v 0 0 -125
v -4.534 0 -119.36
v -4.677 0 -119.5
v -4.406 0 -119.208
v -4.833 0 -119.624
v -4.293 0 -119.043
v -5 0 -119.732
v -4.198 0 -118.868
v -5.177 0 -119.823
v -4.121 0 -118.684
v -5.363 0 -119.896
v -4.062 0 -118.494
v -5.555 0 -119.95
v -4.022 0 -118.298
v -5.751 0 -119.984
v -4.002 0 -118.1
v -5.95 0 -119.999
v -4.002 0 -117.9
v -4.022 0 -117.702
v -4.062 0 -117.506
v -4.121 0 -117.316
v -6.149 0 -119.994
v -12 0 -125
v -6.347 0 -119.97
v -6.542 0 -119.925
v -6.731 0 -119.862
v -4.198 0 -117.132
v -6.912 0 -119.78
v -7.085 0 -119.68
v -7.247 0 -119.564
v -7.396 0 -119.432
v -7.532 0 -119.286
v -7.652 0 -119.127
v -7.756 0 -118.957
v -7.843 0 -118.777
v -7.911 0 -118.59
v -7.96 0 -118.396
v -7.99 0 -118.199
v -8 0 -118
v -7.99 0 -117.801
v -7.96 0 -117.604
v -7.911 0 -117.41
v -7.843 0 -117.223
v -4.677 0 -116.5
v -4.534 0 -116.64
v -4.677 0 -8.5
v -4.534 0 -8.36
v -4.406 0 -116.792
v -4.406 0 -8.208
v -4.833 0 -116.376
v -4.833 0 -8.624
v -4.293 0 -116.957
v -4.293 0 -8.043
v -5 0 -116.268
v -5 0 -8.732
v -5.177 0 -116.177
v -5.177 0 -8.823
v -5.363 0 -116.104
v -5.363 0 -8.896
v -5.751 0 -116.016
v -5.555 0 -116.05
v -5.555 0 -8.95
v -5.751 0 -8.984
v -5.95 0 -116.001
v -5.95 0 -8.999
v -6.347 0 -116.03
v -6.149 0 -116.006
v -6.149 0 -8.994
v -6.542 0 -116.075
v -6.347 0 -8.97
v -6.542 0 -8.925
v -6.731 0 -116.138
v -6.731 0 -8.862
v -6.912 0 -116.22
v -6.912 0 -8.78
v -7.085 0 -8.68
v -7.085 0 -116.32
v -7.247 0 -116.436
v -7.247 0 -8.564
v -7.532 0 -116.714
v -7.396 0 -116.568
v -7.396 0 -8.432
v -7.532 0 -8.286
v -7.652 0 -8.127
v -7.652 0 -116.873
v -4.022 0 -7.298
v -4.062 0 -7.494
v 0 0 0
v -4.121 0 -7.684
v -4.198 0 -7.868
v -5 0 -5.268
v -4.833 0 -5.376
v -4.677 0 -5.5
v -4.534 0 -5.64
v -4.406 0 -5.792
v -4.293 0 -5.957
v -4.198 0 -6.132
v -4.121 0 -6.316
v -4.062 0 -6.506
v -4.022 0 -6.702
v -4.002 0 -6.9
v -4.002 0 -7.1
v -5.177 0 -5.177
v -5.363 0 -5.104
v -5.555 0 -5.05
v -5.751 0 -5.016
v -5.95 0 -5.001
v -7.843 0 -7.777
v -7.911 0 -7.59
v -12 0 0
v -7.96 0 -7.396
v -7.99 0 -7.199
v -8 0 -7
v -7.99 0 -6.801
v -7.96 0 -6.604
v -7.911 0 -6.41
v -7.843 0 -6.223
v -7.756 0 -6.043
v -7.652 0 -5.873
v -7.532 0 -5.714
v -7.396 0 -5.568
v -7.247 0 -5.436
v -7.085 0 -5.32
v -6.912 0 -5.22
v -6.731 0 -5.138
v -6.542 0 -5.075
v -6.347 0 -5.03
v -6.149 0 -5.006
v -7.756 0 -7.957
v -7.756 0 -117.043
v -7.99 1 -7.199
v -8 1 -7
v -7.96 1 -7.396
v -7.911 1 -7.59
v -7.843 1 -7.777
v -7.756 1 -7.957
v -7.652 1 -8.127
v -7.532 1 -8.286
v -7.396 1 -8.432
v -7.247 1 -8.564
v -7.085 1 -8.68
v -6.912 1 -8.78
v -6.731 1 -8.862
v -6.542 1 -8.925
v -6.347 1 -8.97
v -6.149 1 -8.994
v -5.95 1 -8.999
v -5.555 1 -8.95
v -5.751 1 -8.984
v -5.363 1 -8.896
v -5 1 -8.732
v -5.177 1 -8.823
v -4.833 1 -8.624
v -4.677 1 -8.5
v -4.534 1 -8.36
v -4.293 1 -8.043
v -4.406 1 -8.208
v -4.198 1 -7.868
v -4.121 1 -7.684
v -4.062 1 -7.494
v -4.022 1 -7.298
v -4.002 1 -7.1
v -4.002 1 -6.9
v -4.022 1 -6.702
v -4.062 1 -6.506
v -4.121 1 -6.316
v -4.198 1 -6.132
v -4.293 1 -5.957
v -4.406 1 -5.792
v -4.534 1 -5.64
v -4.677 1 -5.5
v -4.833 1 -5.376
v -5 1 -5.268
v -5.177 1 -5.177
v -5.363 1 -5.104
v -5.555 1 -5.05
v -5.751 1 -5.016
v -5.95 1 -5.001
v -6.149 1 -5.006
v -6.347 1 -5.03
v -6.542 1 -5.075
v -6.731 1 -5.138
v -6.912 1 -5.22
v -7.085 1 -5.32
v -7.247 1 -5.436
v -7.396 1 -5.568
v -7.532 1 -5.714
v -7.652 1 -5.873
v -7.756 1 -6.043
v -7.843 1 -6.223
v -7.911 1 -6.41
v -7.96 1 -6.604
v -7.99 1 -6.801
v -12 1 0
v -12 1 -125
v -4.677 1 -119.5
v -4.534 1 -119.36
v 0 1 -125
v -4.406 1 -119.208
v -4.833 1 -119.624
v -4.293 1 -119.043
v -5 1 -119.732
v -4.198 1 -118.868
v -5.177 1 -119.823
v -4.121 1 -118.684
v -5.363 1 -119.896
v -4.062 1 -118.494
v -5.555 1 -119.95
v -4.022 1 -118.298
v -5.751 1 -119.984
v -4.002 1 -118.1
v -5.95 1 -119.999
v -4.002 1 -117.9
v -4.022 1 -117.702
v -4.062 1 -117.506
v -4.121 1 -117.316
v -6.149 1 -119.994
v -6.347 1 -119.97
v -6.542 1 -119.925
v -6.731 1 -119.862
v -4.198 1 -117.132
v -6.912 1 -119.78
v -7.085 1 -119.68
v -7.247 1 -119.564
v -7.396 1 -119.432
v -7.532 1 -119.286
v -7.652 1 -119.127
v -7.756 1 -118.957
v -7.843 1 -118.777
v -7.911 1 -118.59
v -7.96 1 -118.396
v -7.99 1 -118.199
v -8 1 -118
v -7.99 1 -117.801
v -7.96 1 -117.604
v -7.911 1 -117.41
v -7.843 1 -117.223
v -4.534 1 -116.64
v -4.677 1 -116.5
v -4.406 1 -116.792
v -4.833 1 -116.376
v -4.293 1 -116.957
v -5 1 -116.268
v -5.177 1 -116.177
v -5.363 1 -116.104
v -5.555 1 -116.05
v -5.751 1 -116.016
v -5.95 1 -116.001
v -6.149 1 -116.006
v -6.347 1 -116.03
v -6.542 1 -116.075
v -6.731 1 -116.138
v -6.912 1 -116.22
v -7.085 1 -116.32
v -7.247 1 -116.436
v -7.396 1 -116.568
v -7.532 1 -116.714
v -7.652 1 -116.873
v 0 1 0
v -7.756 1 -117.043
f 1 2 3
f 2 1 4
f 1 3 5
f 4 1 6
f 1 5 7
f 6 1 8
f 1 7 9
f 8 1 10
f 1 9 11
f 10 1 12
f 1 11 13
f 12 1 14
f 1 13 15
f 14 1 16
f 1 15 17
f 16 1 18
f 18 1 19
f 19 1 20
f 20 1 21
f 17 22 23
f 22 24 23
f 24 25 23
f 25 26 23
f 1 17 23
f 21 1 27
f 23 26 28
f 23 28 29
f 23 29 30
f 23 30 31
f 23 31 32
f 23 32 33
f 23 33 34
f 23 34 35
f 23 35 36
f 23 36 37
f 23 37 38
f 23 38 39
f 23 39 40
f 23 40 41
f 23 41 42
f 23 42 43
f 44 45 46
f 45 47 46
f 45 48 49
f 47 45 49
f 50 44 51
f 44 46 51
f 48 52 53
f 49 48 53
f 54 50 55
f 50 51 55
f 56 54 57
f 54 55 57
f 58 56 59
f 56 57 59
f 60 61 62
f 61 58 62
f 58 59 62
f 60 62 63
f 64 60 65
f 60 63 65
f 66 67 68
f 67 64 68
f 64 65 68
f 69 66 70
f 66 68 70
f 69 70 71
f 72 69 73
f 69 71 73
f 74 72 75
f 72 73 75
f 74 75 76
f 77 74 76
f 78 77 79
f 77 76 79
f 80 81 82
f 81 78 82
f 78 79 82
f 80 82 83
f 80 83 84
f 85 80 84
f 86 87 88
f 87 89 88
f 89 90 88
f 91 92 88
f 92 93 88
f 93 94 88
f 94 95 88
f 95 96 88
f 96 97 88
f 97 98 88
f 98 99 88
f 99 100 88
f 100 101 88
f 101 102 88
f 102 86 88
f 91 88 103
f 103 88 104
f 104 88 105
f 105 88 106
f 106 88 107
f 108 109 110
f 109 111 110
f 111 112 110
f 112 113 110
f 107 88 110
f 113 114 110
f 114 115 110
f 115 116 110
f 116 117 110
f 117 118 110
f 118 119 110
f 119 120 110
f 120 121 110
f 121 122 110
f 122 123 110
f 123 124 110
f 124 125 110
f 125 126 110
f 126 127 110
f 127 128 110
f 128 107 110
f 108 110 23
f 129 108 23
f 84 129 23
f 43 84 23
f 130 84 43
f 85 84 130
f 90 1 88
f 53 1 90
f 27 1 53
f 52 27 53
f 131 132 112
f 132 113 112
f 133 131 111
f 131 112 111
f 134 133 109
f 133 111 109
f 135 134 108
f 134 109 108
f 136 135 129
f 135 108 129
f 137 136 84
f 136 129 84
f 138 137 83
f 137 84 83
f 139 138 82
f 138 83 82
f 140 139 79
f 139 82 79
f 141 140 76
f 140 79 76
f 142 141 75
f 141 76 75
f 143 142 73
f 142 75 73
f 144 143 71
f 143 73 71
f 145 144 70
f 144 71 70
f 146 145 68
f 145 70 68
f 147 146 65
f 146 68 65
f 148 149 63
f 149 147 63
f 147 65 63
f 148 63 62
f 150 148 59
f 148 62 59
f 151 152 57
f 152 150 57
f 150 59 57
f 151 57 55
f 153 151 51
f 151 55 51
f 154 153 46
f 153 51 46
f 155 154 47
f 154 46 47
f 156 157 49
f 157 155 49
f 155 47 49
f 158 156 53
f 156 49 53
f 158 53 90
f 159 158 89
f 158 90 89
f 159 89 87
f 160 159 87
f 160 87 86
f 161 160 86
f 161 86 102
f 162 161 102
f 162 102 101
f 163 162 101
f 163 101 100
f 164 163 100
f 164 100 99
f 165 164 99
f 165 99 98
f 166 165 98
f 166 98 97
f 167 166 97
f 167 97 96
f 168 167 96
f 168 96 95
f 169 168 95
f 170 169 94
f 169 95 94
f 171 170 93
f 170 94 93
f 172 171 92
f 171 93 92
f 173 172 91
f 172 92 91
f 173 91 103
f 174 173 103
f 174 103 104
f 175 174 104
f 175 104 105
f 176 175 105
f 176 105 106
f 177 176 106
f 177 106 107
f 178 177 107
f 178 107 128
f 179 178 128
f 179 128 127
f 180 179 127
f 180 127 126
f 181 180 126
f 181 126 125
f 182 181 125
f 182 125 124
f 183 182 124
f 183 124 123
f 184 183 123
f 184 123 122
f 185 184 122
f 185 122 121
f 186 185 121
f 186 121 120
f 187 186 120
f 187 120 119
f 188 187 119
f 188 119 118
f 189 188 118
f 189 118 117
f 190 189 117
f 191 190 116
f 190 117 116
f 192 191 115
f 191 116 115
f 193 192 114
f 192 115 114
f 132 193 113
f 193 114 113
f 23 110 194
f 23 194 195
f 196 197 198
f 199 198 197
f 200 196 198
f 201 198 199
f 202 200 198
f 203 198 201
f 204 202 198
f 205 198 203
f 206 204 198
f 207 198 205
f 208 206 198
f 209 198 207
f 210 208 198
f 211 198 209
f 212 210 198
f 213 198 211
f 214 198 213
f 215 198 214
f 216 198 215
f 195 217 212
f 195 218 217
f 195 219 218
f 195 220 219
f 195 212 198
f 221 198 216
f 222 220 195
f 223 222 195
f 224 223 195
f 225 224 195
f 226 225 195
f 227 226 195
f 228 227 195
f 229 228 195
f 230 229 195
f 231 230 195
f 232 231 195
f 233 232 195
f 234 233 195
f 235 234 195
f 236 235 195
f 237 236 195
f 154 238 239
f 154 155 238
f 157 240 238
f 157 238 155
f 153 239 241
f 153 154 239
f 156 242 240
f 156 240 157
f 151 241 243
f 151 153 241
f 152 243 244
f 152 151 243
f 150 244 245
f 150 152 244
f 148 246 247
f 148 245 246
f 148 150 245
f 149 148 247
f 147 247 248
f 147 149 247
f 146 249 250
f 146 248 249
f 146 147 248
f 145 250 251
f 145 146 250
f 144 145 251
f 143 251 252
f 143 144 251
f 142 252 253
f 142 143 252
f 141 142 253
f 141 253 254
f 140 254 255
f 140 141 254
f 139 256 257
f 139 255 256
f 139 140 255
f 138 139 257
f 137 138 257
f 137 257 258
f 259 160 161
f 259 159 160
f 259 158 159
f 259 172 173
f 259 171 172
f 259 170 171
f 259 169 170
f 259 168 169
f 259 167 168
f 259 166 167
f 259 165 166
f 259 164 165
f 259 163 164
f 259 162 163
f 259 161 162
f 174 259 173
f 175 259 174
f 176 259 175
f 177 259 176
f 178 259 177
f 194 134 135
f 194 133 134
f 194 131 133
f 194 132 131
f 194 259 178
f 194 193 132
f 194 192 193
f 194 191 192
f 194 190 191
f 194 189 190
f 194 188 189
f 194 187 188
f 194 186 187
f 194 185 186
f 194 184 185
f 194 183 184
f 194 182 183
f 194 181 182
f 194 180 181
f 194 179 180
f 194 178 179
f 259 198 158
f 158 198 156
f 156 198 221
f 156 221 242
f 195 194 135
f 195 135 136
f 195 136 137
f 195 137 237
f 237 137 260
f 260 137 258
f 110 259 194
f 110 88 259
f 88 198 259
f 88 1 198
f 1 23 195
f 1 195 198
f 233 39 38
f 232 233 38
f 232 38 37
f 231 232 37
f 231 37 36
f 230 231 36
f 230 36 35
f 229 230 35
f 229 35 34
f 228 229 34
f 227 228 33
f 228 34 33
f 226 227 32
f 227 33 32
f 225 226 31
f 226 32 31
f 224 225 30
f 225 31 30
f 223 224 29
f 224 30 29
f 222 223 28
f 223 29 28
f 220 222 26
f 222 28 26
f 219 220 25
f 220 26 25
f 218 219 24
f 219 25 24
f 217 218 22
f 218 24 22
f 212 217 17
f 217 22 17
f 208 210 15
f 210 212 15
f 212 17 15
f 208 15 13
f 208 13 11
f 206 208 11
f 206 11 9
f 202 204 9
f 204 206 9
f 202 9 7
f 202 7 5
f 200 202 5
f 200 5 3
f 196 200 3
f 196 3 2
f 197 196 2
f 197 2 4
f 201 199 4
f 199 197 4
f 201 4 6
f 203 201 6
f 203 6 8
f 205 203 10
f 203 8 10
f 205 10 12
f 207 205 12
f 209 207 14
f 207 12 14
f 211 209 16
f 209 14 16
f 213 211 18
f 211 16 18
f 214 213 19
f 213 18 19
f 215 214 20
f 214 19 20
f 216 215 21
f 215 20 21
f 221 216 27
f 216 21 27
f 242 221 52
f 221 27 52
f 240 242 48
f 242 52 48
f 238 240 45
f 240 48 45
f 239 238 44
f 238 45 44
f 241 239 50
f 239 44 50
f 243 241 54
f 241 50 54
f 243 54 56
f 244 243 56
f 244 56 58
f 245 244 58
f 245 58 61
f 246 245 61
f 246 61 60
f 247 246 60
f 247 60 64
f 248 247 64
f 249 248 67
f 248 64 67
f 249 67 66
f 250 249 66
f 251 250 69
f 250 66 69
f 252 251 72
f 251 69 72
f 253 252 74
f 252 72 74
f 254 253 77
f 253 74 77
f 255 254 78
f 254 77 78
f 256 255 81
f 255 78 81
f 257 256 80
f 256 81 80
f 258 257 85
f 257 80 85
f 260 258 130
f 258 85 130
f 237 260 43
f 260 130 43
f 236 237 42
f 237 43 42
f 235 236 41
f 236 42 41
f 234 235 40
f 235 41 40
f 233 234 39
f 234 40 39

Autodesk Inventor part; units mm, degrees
ref_plane "YZ Plane" through (0, 0, 0) normal (1, 0, 0) x (0, 1, 0)
ref_plane "XZ Plane" through (0, 0, 0) normal (0, 1, 0) x (-1, 0, 0)
ref_plane "XY Plane" through (0, 0, 0) normal (0, 0, 1) x (1, 0, 0)
sketch "Sketch1" plane through (0, 0, 0) normal (0, 1, 0) x (-1, 0, 0)
  line L0 (0, 0) -> (12, 0)
  line L1 (12, 0) -> (12, -125)
  line L2 (12, -125) -> (0, -125)
  line L3 (0, -125) -> (0, 0)
  circle A0 centre (6, -7) radius 2
  circle A1 centre (6, -118) radius 2
  dimension "d0" = 12
  dimension "d1" = 125
  dimension "d2" = 4
  dimension "d6" = 7
  dimension "d7" = 6
  dimension "d36" = 4
  dimension "d37" = 111
  dimension "d38" = 7
extrude "Extrusion1" add sketch "Sketch1" along normal blind 1
sketch "Sketch4" plane through (0, 1, 0) normal (0, 1, 0) x (1, 0, 0)
  circle A0 centre (-6, 118) radius 2 projected
  line L0 (-6, 118) -> (-6, 62.5) construction
  circle A1 centre (-6, 62.5) radius 55.5
  point P0 (0, 0)
  point P1 (-6, 3.7)
  dimension "d39" = 55.5
properties part number "Heater Fixing Bar" material "Aluminum 6061"
